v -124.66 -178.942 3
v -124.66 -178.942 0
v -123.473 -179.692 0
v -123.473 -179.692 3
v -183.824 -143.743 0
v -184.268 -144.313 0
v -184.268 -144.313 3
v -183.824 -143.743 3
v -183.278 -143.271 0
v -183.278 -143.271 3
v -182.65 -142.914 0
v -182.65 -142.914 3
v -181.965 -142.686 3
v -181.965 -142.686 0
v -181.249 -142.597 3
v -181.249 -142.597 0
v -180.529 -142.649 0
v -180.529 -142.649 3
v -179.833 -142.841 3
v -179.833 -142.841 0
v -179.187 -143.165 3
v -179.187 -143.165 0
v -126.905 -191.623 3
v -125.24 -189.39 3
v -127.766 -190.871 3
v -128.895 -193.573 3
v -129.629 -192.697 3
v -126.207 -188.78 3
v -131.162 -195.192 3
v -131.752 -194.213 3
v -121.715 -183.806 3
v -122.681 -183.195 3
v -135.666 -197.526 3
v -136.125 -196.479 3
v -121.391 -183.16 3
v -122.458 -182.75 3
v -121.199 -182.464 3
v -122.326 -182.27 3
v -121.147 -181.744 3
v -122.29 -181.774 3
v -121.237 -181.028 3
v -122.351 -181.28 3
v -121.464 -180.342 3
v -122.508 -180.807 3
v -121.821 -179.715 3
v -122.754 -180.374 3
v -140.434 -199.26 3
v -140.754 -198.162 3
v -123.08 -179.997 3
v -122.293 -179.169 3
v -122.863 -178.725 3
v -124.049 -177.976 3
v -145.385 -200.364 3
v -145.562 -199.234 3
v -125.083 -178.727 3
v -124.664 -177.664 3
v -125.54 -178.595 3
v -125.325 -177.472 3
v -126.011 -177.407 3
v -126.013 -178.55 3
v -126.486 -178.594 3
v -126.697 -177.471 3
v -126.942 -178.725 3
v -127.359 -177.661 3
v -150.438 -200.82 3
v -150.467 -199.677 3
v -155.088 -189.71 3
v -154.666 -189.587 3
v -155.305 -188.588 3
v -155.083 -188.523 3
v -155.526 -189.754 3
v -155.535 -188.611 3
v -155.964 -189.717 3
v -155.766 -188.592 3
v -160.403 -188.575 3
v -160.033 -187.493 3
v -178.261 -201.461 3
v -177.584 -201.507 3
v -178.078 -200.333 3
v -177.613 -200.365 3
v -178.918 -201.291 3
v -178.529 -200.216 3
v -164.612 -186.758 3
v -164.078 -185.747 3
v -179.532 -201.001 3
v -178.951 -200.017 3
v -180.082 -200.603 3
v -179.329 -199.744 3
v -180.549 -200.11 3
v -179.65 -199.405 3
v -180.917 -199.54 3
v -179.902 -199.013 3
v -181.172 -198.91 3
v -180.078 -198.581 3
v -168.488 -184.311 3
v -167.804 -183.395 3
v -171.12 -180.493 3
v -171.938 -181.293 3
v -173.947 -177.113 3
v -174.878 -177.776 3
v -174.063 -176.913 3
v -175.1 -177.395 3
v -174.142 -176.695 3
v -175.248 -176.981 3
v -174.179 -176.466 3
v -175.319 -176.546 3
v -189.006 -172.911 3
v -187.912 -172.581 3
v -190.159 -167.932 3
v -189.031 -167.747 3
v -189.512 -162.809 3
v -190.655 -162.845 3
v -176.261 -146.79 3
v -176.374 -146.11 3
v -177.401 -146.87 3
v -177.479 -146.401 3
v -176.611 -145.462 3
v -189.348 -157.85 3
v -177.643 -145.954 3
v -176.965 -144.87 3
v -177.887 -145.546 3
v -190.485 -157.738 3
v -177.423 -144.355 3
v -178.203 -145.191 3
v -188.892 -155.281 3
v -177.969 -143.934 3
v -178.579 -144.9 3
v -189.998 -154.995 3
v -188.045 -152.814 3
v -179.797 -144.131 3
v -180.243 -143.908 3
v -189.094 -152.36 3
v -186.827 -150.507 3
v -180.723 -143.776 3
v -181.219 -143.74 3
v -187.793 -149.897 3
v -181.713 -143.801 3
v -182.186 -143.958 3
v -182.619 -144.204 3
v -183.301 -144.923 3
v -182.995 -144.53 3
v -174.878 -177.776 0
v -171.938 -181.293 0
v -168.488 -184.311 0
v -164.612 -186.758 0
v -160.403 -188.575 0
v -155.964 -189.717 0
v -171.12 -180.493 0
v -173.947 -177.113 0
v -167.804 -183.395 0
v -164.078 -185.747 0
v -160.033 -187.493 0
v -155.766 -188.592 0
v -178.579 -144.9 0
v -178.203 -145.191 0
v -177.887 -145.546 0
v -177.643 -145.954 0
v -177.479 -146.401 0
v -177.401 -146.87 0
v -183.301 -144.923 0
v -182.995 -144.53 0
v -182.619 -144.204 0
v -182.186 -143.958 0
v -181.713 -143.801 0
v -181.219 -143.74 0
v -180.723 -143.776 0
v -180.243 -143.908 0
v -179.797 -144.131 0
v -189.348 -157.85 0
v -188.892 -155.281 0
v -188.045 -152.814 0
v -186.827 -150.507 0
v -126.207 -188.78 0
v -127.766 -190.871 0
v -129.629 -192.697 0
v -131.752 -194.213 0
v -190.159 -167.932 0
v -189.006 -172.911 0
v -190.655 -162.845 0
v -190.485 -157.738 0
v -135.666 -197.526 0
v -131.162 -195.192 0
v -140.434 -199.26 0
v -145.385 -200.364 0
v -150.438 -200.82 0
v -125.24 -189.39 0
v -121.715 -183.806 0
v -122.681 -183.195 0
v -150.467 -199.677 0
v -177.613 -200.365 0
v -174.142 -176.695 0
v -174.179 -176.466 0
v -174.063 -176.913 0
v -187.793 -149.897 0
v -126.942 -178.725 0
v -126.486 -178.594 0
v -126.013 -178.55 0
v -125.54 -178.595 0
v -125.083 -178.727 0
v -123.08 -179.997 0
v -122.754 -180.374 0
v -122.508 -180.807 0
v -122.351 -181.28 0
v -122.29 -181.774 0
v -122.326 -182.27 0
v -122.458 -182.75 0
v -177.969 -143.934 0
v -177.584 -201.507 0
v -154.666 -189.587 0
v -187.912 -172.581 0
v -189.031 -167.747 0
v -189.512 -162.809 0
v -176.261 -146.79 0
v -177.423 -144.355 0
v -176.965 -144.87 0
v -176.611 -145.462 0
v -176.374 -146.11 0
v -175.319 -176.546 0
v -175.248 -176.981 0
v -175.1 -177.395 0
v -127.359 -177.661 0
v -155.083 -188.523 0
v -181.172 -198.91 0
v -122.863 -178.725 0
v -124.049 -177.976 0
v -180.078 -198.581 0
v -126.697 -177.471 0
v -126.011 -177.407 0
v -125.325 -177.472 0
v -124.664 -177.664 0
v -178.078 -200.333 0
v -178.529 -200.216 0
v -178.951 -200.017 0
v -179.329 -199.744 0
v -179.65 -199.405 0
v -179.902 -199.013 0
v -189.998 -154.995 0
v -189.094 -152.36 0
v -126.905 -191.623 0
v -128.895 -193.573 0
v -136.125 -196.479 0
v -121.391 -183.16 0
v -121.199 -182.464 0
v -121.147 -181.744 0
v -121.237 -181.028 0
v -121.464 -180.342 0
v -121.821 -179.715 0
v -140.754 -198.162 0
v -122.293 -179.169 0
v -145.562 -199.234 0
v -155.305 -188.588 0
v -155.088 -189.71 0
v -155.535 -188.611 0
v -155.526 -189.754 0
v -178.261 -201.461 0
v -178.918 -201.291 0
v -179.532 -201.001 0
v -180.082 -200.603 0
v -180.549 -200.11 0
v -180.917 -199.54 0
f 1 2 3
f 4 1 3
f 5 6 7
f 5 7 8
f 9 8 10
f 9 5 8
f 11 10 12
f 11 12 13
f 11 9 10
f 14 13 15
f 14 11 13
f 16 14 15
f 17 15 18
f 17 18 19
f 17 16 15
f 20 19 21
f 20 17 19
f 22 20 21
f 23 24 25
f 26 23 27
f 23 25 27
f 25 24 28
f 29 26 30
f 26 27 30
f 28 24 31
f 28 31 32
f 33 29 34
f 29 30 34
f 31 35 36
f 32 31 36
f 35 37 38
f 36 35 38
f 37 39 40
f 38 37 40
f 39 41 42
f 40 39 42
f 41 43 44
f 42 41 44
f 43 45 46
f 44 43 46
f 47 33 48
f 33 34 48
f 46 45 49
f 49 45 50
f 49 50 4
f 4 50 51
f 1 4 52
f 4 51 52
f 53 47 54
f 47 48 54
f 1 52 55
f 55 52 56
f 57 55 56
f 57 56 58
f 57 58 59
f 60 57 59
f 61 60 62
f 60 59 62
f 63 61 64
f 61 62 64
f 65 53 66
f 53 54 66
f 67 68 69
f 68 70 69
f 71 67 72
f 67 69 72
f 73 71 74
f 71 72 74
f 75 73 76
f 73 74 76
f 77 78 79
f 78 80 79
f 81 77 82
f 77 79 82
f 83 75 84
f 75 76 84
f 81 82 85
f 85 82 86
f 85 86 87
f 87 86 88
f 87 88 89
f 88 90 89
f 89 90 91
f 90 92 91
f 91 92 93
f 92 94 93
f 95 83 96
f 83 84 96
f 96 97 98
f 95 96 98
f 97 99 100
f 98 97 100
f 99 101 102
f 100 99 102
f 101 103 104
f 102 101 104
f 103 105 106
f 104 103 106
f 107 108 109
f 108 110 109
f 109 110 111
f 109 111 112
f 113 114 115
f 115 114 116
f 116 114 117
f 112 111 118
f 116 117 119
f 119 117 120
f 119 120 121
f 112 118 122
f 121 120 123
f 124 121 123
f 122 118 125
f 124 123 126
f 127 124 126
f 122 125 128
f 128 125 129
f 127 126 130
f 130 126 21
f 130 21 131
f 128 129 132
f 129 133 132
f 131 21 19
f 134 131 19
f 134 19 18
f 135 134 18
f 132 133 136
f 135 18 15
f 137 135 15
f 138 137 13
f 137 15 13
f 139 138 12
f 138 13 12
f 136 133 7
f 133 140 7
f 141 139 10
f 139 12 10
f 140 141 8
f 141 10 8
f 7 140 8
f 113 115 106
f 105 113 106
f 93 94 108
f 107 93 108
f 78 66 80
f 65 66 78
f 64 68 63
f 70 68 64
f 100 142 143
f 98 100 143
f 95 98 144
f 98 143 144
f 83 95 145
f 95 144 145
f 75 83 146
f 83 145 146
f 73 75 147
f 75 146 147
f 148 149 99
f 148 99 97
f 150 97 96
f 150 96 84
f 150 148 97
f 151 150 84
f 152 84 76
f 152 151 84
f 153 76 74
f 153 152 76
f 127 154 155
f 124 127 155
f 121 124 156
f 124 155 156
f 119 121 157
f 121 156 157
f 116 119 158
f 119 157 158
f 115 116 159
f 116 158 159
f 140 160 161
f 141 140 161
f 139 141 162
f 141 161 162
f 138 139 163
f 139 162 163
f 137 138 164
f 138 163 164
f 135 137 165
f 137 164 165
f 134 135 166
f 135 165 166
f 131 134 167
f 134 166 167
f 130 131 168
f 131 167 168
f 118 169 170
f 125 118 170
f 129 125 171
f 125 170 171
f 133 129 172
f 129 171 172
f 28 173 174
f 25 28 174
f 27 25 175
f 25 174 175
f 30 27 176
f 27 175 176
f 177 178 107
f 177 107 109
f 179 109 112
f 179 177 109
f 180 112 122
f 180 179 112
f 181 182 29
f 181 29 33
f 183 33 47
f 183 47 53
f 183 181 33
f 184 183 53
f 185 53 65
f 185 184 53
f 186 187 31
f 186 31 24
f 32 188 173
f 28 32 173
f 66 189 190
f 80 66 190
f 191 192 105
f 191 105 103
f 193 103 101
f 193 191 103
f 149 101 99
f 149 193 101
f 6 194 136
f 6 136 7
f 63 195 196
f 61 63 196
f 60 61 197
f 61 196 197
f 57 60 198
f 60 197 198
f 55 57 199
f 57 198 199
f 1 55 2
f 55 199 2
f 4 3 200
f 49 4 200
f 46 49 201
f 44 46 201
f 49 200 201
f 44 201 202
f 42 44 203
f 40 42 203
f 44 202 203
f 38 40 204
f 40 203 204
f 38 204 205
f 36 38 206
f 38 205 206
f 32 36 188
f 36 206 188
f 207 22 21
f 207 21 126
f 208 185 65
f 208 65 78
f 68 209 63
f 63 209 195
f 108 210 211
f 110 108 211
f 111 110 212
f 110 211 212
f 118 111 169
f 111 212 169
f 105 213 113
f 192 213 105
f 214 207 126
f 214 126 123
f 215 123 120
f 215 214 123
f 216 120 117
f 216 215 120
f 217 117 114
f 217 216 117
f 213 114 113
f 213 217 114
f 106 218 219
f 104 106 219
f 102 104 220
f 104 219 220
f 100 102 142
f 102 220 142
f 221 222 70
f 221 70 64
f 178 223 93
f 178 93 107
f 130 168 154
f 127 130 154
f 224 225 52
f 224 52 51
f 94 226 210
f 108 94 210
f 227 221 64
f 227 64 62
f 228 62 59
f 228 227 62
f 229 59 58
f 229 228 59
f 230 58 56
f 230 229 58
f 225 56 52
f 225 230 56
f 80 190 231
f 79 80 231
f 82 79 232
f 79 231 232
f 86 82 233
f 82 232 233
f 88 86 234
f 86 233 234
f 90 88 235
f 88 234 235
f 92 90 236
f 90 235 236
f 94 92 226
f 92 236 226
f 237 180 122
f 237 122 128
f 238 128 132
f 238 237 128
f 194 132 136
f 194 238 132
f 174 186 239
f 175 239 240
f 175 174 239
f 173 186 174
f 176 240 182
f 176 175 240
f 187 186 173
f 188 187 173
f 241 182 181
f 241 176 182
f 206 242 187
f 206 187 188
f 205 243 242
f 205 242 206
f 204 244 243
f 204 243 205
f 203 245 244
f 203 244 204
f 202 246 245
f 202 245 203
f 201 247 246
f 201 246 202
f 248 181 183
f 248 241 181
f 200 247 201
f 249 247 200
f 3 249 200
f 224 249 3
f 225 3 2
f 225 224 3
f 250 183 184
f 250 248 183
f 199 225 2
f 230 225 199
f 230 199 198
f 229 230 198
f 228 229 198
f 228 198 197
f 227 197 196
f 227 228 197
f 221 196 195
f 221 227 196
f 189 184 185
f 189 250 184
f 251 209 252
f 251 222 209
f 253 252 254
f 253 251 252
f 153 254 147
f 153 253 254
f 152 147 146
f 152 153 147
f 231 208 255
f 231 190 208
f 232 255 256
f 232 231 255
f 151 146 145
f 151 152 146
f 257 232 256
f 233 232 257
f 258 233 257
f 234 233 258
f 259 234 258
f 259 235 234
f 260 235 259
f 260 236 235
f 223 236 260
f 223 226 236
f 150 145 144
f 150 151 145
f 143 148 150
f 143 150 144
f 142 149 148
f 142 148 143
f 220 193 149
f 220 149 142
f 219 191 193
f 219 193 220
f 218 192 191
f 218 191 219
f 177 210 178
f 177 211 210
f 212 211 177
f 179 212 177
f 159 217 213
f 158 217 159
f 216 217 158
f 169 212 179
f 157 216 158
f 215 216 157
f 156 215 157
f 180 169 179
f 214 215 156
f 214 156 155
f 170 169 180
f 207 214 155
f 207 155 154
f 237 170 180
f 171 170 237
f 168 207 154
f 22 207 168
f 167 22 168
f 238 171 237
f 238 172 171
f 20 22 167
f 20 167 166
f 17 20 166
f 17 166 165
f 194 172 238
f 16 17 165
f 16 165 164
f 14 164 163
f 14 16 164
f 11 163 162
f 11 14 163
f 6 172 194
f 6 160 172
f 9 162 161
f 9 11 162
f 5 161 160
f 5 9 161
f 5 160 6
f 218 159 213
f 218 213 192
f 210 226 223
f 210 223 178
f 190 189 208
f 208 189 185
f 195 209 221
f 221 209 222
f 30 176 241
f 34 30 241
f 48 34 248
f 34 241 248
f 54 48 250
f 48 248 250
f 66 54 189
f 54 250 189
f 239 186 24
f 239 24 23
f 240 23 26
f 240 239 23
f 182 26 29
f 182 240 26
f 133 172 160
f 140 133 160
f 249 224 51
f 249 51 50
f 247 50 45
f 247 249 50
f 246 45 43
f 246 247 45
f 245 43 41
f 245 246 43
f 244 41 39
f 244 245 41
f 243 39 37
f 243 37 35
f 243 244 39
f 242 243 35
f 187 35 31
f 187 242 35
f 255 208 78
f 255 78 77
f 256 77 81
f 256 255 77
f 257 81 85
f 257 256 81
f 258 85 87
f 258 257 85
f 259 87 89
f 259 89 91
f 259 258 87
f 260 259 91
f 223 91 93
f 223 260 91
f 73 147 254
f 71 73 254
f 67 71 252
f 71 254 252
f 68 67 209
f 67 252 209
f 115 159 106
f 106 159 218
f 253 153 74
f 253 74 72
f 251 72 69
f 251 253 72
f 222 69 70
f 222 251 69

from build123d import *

# Parameters (mm, degrees)
BOSS_EXTRUDE1_DEPTH = 3


with BuildPart() as part:
    # Sketch1 → Boss-Extrude1 (new body)
    with BuildSketch(Plane.XY):
        with BuildLine():
            Line((-176.261287631, -146.790125913), (-174.178854352, -176.465678255))
            ThreePointArc((-174.178854352, -176.465678255), (-174.10743246, -176.805459554), (-173.946658522, -177.113199961))
            ThreePointArc((-173.946658522, -177.113199961), (-165.987154225, -184.643491087), (-155.766014333, -188.591565607))
            ThreePointArc((-155.766014333, -188.591565607), (-155.419681283, -188.604453413), (-155.08275986, -188.523233763))
            Line((-155.08275986, -188.523233763), (-127.359223318, -177.660950501))
            ThreePointArc((-127.359223318, -177.660950501), (-125.666782112, -177.423691901), (-124.049456606, -177.975875826))
            Line((-124.049456606, -177.975875826), (-122.862735706, -178.725113106))
            ThreePointArc((-122.862735706, -178.725113106), (-121.236507239, -181.027562815), (-121.714667864, -183.805557795))
            Line((-121.714667864, -183.805557795), (-125.240247105, -189.389741443))
            ThreePointArc((-125.240247105, -189.389741443), (-127.862246775, -192.636349191), (-131.161557479, -195.191714728))
            ThreePointArc((-131.161557479, -195.191714728), (-140.433747596, -199.259536064), (-150.43809188, -200.819592292))
            Line((-150.43809188, -200.819592292), (-177.583691953, -201.507185822))
            ThreePointArc((-177.583691953, -201.507185822), (-179.816644976, -200.815129336), (-181.172145987, -198.910493309))
            Line((-181.172145987, -198.910493309), (-189.006171765, -172.910792767))
            ThreePointArc((-189.006171765, -172.910792767), (-190.489642304, -165.396715762), (-190.485324726, -157.737602274))
            ThreePointArc((-190.485324726, -157.737602274), (-189.596958817, -153.660084628), (-187.793276628, -149.89683142))
            Line((-187.793276628, -149.89683142), (-184.267697387, -144.312647772))
            ThreePointArc((-184.267697387, -144.312647772), (-181.965247678, -142.686419305), (-179.187252699, -143.16457993))
            Line((-179.187252699, -143.16457993), (-177.969064462, -143.933684141))
            ThreePointArc((-177.969064462, -143.933684141), (-176.774137848, -145.158008999), (-176.261287631, -146.790125913))
        make_face()
        with BuildLine():
            Line((-177.401483744, -146.870137307), (-175.319050465, -176.54568965))
            ThreePointArc((-175.319050465, -176.54568965), (-175.183348871, -177.191274117), (-174.877878388, -177.775980891))
            ThreePointArc((-174.877878388, -177.775980891), (-166.597350632, -185.60998441), (-155.963970787, -189.717293035))
            ThreePointArc((-155.963970787, -189.717293035), (-155.305937992, -189.741779868), (-154.665787288, -189.587462533))
            Line((-154.665787288, -189.587462533), (-126.942250746, -178.72517927))
            ThreePointArc((-126.942250746, -178.72517927), (-125.775049914, -178.56155265), (-124.659653013, -178.94236915))
            Line((-124.659653013, -178.94236915), (-123.472932113, -179.69160643))
            ThreePointArc((-123.472932113, -179.69160643), (-122.351395239, -181.279502781), (-122.681161188, -183.195361388))
            Line((-122.681161188, -183.195361388), (-126.206740429, -188.779545035))
            ThreePointArc((-126.206740429, -188.779545035), (-128.66220108, -191.819941137), (-131.751952653, -194.21299999))
            ThreePointArc((-131.751952653, -194.21299999), (-140.75407898, -198.162341093), (-150.467034596, -199.67695879))
            Line((-150.467034596, -199.67695879), (-177.612634669, -200.36455232))
            ThreePointArc((-177.612634669, -200.36455232), (-179.146576312, -199.889139604), (-180.077746571, -198.580737463))
            Line((-180.077746571, -198.580737463), (-187.911772349, -172.581036921))
            ThreePointArc((-187.911772349, -172.581036921), (-189.352035008, -165.285816528), (-189.347843185, -157.849784016))
            ThreePointArc((-189.347843185, -157.849784016), (-188.515902755, -154.031254117), (-186.826783305, -150.507027827))
            Line((-186.826783305, -150.507027827), (-183.301204063, -144.922844179))
            ThreePointArc((-183.301204063, -144.922844179), (-181.713307713, -143.801307305), (-179.797449106, -144.131073254))
            Line((-179.797449106, -144.131073254), (-178.579260869, -144.900177465))
            ThreePointArc((-178.579260869, -144.900177465), (-177.755173549, -145.744539435), (-177.401483744, -146.870137307))
        make_face(mode=Mode.SUBTRACT)
    extrude(amount=BOSS_EXTRUDE1_DEPTH)


solid = part.part
